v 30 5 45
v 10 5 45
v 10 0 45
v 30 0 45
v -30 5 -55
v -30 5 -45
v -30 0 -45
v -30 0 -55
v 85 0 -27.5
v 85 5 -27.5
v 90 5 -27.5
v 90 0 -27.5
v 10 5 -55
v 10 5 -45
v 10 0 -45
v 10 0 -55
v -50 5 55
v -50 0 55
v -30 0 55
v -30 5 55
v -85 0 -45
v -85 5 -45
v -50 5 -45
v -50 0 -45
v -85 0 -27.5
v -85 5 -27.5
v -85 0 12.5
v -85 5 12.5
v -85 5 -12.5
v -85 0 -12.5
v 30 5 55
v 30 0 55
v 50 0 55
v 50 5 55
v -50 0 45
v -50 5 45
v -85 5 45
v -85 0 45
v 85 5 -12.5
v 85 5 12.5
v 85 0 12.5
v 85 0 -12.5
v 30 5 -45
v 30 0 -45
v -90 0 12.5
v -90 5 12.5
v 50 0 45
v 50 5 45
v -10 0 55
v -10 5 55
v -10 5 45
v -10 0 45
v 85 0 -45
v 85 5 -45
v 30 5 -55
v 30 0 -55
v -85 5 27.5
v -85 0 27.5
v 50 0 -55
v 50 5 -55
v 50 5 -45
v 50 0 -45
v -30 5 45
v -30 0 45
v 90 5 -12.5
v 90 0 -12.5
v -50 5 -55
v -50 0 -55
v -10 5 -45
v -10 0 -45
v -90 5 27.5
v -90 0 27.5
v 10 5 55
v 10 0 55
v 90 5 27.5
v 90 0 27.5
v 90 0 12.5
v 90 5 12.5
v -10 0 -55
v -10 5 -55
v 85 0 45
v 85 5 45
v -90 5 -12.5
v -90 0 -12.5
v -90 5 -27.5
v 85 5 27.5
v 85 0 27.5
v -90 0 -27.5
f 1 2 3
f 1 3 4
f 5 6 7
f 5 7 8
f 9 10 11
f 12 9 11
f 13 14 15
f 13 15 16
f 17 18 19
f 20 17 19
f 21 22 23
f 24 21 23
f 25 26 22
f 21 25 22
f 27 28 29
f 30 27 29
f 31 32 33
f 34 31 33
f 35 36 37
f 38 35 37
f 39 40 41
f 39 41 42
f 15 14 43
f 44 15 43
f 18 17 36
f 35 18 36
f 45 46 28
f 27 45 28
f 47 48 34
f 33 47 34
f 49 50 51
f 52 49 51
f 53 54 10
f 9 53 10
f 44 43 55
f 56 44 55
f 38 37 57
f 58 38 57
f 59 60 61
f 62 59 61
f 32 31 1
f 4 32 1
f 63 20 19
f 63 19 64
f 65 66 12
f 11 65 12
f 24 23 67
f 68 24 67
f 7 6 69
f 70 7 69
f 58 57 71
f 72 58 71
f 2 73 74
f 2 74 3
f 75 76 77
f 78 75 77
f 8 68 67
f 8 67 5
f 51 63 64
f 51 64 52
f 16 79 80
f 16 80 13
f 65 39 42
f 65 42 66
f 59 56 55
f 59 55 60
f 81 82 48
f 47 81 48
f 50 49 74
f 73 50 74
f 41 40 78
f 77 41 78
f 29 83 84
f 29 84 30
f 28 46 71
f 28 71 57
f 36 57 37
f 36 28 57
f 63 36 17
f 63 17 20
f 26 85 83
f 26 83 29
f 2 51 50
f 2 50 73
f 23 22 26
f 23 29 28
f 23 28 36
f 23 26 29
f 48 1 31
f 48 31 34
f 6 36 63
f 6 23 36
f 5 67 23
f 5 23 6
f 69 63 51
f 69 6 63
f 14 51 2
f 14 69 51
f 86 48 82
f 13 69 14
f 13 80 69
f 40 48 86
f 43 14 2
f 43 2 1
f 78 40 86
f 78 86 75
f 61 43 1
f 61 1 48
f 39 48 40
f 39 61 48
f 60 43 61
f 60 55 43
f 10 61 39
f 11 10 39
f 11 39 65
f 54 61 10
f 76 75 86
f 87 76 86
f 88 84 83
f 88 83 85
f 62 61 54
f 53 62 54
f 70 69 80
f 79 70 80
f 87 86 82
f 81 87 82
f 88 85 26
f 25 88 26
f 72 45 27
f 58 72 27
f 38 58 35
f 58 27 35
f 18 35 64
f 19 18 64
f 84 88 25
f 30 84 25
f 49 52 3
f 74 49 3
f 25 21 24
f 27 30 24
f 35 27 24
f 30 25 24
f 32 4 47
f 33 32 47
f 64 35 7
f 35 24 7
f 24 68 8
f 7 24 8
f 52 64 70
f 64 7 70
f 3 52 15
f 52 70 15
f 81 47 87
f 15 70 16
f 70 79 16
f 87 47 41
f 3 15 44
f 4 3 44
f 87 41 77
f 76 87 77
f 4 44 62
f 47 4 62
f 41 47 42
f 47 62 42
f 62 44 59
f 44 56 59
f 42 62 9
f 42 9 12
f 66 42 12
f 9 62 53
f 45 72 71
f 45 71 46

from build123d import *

# Parameters (mm, degrees)
ESQUISSE1_W             = 180
ESQUISSE1_H             = 110
BOSS_EXTRU_1_DEPTH      = 5
ESQUISSE2_W             = 20
ESQUISSE2_H             = 10
ESQUISSE2_W_2           = 5
ESQUISSE2_H_2           = 25
ENL_V_MAT_EXTRU_1_DEPTH = 5


with BuildPart() as part:
    # Esquisse1 → Boss.-Extru.1 (new body)
    with BuildSketch(Plane(origin=(0, 0, 0), x_dir=(1, 0, 0), z_dir=(0, 1, 0))):
        Rectangle(ESQUISSE1_W, ESQUISSE1_H)
    extrude(amount=BOSS_EXTRU_1_DEPTH)

    # Esquisse2 → Enlèv. mat.-Extru.1 (cut)
    with BuildSketch(Plane(origin=(0, 5, 0), x_dir=(1, 0, 0), z_dir=(0, 1, 0))):
        Polygon((-90, 55), (-90, 27.5), (-85, 27.5), (-85, 45), (-50, 45), (-50, 55), align=None)
        Polygon((85, 27.5), (90, 27.5), (90, 55), (50, 55), (50, 45), (85, 45), align=None)
        with Locations((20, 50)):
            Rectangle(ESQUISSE2_W, ESQUISSE2_H)
        with Locations((-20, 50)):
            Rectangle(ESQUISSE2_W, ESQUISSE2_H)
        with Locations((-87.5, 0)):
            Rectangle(ESQUISSE2_W_2, ESQUISSE2_H_2)
        Polygon((-90, -55), (-50, -55), (-50, -45), (-85, -45), (-85, -27.5), (-90, -27.5), align=None)
        Polygon((50, -45), (50, -55), (90, -55), (90, -27.5), (85, -27.5), (85, -45), align=None)
        with Locations((87.5, 0)):
            Rectangle(ESQUISSE2_W_2, ESQUISSE2_H_2)
        with Locations((20, -50)):
            Rectangle(ESQUISSE2_W, ESQUISSE2_H)
        with Locations((-20, -50)):
            Rectangle(ESQUISSE2_W, ESQUISSE2_H)
    extrude(amount=-ENL_V_MAT_EXTRU_1_DEPTH, mode=Mode.SUBTRACT)


solid = part.part
